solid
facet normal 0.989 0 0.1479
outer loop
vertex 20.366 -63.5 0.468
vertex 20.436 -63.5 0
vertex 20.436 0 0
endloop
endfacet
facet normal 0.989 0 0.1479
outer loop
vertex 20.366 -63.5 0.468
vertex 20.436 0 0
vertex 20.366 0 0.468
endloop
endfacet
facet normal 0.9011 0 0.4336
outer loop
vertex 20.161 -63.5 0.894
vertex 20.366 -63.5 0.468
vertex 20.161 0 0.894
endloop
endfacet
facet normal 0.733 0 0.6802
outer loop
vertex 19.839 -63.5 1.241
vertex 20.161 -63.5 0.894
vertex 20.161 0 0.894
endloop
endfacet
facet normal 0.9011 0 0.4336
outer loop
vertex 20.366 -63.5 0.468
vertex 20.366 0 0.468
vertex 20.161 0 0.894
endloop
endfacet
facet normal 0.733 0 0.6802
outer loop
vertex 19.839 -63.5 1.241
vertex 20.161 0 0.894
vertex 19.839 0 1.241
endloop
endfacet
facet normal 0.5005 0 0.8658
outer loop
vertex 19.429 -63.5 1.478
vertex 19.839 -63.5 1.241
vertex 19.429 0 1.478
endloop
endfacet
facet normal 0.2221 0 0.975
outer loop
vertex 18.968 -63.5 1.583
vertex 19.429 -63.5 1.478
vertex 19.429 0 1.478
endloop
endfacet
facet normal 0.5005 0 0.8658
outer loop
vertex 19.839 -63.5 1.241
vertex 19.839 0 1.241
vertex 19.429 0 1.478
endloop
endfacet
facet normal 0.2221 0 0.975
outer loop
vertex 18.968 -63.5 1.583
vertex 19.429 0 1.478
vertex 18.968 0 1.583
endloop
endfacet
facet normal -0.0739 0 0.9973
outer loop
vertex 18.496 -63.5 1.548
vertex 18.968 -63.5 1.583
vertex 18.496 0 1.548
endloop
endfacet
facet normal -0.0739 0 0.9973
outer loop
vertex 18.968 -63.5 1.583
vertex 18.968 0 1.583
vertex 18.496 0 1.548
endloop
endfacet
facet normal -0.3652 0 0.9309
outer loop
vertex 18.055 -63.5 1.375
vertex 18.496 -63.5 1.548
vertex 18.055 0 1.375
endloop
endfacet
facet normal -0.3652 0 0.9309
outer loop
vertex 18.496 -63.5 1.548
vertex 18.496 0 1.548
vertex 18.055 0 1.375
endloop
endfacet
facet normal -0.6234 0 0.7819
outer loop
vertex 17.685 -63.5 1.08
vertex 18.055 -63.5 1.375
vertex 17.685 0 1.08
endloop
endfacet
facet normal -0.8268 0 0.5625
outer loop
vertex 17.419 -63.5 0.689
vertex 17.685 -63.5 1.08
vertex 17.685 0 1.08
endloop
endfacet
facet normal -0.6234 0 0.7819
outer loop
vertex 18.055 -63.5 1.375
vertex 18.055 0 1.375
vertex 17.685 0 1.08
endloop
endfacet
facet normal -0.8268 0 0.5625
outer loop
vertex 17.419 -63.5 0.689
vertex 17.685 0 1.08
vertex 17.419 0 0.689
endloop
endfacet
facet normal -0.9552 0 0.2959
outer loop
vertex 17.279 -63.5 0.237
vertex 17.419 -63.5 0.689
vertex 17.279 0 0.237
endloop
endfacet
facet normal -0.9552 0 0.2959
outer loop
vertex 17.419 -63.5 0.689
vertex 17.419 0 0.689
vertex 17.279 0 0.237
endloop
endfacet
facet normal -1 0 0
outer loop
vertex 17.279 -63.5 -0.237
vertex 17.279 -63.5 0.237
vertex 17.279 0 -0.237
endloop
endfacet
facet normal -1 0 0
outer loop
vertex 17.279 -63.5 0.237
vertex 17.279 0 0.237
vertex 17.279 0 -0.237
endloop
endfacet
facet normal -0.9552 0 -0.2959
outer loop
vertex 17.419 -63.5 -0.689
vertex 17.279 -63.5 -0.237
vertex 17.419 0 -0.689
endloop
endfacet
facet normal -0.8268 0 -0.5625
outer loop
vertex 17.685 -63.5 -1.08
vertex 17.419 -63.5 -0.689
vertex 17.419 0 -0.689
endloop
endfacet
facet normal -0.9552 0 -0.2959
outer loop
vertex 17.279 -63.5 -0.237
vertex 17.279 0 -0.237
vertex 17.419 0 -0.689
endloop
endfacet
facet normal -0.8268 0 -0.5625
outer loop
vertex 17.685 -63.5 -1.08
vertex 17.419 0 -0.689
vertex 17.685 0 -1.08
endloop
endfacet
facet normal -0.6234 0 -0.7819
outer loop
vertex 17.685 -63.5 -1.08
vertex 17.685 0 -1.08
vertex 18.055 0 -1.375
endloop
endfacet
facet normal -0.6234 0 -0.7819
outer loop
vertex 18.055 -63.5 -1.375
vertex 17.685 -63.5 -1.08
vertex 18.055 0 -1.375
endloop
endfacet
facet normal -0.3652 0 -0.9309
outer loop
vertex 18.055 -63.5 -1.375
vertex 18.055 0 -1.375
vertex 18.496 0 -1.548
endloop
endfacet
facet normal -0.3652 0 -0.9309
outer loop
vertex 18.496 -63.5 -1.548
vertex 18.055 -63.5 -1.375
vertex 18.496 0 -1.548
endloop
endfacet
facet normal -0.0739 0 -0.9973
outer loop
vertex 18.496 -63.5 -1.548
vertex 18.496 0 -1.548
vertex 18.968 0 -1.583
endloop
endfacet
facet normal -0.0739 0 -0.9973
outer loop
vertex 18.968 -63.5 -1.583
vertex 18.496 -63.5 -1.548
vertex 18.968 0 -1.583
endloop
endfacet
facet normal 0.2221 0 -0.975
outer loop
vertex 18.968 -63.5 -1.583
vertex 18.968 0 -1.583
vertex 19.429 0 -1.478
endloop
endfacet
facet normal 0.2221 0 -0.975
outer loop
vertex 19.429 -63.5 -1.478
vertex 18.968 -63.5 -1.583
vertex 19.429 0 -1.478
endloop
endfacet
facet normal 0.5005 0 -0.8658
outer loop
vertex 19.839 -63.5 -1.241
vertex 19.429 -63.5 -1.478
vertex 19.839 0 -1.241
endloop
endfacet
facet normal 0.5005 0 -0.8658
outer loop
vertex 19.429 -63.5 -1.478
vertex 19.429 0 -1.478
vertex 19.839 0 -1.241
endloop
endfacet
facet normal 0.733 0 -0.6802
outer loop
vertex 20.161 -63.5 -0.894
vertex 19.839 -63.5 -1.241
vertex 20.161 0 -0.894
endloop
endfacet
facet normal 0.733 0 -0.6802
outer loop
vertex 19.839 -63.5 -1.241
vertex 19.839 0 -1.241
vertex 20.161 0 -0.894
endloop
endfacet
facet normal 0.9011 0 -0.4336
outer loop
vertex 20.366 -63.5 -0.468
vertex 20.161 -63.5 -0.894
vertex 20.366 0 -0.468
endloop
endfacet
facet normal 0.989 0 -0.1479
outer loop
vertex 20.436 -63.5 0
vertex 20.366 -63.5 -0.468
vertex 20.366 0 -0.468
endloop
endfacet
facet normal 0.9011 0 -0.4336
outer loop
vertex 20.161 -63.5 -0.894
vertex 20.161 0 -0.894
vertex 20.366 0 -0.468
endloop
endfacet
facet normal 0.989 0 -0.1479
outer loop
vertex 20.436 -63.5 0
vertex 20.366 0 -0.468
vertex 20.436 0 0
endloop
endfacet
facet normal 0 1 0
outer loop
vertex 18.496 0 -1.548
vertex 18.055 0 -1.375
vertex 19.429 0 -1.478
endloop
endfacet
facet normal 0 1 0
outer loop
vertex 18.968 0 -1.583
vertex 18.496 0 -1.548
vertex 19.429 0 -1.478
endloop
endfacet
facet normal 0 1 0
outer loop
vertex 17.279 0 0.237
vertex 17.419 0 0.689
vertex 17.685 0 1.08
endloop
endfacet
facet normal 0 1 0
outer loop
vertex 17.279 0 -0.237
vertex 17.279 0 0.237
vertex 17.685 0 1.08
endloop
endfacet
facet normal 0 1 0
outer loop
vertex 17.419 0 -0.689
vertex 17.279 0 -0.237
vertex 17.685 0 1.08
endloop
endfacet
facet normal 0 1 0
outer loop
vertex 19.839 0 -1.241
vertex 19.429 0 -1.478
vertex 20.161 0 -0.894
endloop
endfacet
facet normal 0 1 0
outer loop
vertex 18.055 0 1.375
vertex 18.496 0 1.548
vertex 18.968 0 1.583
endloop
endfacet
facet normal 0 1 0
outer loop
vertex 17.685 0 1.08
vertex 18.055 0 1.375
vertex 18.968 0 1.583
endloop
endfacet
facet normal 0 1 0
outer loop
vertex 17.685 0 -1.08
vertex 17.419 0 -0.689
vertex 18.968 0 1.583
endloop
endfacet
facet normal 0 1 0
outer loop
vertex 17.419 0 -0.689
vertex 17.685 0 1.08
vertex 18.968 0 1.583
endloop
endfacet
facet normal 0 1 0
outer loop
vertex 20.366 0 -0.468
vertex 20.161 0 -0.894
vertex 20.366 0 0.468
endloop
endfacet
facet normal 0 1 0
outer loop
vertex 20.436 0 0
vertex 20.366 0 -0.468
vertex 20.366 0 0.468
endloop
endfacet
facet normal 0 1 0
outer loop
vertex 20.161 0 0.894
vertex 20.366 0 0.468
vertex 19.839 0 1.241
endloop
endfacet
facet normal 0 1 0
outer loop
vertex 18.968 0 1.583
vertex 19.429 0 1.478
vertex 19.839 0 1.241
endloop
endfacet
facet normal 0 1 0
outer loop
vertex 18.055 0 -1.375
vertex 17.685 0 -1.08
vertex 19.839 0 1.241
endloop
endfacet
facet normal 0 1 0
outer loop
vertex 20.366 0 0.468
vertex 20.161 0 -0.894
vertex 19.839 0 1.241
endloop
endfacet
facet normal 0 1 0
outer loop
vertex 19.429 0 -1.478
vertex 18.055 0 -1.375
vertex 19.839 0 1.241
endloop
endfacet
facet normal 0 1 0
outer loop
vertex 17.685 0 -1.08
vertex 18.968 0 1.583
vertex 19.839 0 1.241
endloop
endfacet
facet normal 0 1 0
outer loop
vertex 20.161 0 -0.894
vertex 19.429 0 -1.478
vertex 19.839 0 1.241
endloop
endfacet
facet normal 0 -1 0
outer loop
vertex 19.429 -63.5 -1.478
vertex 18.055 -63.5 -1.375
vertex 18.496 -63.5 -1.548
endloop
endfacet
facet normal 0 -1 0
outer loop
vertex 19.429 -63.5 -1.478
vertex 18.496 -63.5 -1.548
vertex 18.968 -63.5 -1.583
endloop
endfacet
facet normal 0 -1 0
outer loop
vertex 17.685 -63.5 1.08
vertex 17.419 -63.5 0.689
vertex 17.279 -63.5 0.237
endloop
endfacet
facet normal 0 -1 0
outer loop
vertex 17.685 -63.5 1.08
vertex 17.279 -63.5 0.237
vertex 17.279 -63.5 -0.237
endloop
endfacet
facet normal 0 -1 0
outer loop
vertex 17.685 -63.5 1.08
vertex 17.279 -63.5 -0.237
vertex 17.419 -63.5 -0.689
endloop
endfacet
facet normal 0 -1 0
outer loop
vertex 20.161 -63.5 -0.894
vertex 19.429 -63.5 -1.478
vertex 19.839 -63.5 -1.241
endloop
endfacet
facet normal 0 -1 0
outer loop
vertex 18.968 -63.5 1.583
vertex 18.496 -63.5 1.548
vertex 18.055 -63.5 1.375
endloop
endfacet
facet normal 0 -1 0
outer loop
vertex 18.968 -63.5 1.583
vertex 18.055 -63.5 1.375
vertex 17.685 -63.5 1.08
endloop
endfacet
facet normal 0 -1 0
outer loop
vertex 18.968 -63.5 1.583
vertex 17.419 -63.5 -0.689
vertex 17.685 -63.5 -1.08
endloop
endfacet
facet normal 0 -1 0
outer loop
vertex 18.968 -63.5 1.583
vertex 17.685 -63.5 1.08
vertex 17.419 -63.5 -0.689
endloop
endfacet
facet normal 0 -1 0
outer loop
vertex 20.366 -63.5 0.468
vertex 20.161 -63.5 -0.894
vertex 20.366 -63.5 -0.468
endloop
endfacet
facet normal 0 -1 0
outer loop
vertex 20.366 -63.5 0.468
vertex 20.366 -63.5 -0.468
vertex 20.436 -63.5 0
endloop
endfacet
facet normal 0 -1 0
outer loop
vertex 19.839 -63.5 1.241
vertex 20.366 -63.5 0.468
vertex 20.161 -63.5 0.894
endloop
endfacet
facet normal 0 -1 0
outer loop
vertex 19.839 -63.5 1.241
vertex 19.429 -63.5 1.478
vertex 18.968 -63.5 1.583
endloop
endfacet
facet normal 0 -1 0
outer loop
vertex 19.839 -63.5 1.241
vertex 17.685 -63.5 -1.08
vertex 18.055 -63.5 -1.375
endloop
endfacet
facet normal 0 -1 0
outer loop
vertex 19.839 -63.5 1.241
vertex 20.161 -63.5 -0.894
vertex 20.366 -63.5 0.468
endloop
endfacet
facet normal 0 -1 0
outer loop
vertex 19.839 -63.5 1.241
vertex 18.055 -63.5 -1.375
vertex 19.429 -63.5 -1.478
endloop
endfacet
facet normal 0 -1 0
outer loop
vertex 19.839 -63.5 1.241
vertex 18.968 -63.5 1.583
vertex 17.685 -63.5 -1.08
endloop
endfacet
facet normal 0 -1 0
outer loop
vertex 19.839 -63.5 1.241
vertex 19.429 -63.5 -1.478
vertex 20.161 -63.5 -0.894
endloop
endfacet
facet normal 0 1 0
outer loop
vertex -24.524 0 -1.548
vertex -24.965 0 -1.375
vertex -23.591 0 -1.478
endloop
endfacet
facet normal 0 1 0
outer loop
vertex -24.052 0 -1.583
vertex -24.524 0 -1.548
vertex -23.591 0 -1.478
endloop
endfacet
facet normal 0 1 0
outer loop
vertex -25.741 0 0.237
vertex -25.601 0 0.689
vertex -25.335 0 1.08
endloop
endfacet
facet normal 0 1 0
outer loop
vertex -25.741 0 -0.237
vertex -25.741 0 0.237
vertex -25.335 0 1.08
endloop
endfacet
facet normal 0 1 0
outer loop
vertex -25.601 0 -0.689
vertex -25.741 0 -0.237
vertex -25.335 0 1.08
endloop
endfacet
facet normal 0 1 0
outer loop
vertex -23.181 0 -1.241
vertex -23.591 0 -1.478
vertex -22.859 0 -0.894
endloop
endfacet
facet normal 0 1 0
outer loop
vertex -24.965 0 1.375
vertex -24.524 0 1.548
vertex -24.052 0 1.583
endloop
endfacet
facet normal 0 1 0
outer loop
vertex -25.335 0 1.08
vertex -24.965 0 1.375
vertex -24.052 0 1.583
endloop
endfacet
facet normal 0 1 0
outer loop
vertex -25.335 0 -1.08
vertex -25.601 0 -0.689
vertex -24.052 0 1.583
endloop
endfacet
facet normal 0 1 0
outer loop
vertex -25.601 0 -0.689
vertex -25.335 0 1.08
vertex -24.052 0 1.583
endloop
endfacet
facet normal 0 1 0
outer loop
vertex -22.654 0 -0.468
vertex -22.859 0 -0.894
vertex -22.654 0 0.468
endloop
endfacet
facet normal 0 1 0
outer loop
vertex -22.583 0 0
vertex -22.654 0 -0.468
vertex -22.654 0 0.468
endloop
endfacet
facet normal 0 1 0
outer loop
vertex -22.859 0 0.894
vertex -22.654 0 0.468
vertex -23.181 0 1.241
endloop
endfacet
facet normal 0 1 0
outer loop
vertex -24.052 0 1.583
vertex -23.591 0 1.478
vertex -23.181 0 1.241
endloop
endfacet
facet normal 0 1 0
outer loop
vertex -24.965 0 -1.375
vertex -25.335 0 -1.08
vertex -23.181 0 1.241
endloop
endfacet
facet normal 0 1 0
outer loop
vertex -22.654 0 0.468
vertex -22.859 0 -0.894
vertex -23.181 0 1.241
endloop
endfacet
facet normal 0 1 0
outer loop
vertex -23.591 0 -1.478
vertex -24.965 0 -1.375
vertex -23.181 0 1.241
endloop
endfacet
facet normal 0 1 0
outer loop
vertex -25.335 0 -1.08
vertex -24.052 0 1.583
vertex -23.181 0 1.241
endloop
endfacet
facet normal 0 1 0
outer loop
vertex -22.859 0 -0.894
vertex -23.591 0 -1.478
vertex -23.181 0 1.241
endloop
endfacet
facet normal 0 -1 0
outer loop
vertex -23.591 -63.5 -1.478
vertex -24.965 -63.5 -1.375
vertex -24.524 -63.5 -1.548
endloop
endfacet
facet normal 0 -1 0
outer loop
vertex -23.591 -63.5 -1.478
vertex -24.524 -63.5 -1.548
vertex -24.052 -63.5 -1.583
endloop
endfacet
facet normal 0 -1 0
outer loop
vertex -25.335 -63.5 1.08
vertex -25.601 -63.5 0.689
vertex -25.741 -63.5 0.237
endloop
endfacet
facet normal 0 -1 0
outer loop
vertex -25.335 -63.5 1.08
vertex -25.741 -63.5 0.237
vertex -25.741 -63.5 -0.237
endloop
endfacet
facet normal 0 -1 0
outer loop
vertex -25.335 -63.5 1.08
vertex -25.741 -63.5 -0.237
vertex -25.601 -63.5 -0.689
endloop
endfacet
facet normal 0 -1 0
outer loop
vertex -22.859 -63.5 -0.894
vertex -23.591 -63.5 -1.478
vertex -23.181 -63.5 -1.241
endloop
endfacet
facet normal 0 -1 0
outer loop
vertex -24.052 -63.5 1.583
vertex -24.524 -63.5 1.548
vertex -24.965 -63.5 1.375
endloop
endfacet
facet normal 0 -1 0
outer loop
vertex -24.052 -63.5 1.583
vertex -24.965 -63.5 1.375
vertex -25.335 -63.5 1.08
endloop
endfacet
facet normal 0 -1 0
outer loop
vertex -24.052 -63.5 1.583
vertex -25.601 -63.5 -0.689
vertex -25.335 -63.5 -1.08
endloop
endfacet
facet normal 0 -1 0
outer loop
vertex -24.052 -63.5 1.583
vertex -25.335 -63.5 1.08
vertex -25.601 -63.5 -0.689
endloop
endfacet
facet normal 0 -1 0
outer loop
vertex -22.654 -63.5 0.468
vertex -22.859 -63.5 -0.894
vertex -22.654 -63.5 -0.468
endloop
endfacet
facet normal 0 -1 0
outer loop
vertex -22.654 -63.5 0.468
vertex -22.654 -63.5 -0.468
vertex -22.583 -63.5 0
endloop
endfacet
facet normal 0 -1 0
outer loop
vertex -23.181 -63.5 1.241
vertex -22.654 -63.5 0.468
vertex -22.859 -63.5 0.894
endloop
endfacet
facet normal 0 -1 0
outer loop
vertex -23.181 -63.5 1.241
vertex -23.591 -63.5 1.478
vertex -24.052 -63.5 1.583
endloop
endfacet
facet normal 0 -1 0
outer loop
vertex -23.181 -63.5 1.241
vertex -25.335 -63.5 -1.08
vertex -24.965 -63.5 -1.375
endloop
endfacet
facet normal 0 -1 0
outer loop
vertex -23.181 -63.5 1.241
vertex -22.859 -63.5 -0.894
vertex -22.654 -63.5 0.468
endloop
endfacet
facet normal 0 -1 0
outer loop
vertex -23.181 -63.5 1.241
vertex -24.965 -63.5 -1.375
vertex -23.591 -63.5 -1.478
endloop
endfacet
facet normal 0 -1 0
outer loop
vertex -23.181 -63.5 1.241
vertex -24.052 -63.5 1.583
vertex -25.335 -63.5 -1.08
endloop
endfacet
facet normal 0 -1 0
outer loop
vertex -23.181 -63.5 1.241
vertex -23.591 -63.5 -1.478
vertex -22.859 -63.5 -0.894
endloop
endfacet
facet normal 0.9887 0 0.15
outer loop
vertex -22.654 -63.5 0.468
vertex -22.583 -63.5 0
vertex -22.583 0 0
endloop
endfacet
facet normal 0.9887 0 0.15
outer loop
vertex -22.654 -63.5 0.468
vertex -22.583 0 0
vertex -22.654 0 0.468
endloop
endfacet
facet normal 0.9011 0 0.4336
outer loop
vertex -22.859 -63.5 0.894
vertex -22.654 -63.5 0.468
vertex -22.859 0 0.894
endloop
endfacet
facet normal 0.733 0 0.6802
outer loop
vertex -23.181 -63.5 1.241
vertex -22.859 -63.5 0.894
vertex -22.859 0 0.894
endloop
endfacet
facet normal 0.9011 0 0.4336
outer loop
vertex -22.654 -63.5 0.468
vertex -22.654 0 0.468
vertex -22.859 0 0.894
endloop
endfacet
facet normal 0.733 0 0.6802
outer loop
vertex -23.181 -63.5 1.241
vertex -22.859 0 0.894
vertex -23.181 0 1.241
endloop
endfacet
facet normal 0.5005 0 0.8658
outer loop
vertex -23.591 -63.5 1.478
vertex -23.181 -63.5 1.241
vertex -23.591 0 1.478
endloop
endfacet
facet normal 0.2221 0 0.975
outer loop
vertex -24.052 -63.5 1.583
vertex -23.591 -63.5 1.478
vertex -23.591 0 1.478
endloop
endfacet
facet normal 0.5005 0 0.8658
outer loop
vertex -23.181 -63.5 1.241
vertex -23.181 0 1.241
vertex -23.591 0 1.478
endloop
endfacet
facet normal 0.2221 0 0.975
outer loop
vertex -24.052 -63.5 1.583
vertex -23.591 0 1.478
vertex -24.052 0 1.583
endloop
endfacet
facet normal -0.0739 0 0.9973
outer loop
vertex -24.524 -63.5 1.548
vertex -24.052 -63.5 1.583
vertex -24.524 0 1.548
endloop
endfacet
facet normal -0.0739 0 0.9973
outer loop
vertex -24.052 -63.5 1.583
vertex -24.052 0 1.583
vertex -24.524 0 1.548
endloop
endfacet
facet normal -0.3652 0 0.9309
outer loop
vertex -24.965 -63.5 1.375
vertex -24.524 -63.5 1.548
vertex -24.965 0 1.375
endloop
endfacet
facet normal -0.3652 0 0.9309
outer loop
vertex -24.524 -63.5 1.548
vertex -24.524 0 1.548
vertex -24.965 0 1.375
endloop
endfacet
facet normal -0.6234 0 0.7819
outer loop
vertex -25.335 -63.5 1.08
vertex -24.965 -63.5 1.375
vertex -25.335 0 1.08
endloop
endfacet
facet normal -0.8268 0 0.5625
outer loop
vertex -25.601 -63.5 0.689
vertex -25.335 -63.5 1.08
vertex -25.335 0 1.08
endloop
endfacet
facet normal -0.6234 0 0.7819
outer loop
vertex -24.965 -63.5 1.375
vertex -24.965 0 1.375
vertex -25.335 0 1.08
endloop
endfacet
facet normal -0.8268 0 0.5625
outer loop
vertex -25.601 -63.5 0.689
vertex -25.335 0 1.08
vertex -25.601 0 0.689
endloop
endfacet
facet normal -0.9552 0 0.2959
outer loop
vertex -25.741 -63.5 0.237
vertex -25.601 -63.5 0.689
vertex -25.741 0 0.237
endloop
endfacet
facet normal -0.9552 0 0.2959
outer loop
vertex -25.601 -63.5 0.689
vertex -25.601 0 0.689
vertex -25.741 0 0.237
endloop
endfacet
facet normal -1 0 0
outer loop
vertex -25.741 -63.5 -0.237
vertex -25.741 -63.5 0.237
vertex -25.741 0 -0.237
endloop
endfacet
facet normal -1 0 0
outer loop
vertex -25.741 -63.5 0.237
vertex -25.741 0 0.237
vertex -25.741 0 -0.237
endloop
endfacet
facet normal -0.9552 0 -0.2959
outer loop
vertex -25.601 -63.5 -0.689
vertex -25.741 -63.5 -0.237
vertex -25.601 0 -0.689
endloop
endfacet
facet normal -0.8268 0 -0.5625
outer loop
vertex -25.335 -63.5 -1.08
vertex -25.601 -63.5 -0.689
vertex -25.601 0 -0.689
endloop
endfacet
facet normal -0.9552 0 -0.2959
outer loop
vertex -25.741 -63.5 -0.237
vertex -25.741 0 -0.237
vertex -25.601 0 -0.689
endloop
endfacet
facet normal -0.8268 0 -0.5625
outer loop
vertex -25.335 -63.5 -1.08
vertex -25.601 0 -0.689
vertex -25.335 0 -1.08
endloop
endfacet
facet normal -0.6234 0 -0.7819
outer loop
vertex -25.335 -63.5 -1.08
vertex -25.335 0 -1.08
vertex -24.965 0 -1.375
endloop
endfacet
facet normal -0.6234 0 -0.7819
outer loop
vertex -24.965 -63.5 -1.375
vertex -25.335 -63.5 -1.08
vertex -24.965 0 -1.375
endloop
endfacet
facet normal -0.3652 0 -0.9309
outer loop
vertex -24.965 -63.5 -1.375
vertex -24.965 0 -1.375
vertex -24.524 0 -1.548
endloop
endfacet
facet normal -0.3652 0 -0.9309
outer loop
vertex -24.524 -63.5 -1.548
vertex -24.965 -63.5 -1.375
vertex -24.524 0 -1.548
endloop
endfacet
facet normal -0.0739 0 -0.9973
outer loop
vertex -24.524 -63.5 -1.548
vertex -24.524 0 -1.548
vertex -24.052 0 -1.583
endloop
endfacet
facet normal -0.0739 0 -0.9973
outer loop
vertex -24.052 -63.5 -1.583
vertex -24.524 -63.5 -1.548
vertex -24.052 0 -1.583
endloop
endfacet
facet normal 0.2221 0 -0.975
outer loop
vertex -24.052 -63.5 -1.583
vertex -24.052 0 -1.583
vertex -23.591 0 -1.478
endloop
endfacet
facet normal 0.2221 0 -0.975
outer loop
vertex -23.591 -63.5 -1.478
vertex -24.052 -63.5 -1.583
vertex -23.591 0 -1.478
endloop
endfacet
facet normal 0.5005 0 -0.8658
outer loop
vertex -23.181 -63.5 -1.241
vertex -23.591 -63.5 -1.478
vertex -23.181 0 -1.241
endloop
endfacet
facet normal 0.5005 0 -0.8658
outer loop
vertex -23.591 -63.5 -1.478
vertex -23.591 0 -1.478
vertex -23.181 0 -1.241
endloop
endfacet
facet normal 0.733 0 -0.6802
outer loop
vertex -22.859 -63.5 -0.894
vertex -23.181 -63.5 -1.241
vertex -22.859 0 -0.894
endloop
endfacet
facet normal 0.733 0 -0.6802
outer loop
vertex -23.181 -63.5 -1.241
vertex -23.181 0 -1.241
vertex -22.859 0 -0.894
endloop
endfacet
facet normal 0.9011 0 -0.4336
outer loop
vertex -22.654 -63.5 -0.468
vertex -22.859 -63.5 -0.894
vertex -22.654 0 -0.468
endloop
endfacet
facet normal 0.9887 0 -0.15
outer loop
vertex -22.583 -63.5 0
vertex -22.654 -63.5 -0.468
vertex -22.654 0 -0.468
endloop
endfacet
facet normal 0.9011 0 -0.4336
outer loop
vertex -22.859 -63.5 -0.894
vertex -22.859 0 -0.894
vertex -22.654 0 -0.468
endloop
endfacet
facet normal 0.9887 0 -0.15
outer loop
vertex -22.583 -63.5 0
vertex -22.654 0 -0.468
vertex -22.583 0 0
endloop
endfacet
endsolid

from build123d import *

# Parameters (mm, degrees)
F0_R      = 1.5875
F1_DEPTH  = 38.1
F1_FACE_R = 1.5875
F2_DEPTH  = 25.4
F3_DEPTH  = 25.4


with BuildPart() as f1:
    # F0 (on Front) → F1 (new body)
    with BuildSketch(Plane.XZ):
        with Locations((-24.170939, 0)):
            Circle(F0_R)
        with Locations((18.8489, 0)):
            Circle(F0_R)
    extrude(amount=F1_DEPTH)

    # F1_face (on face) → F2 (join)
    with BuildSketch(Plane(origin=(18.8489, -38.1, 0), x_dir=(1, 0, 0), z_dir=(0, -1, 0))):
        Circle(F1_FACE_R)
    extrude(amount=F2_DEPTH)

    # F1_face (on face) → F3 (join)
    with BuildSketch(Plane(origin=(18.8489, -38.1, 0), x_dir=(1, 0, 0), z_dir=(0, -1, 0))):
        with Locations((-43.019839, 0)):
            Circle(F1_FACE_R)
    extrude(amount=F3_DEPTH)


solid = f1.part
